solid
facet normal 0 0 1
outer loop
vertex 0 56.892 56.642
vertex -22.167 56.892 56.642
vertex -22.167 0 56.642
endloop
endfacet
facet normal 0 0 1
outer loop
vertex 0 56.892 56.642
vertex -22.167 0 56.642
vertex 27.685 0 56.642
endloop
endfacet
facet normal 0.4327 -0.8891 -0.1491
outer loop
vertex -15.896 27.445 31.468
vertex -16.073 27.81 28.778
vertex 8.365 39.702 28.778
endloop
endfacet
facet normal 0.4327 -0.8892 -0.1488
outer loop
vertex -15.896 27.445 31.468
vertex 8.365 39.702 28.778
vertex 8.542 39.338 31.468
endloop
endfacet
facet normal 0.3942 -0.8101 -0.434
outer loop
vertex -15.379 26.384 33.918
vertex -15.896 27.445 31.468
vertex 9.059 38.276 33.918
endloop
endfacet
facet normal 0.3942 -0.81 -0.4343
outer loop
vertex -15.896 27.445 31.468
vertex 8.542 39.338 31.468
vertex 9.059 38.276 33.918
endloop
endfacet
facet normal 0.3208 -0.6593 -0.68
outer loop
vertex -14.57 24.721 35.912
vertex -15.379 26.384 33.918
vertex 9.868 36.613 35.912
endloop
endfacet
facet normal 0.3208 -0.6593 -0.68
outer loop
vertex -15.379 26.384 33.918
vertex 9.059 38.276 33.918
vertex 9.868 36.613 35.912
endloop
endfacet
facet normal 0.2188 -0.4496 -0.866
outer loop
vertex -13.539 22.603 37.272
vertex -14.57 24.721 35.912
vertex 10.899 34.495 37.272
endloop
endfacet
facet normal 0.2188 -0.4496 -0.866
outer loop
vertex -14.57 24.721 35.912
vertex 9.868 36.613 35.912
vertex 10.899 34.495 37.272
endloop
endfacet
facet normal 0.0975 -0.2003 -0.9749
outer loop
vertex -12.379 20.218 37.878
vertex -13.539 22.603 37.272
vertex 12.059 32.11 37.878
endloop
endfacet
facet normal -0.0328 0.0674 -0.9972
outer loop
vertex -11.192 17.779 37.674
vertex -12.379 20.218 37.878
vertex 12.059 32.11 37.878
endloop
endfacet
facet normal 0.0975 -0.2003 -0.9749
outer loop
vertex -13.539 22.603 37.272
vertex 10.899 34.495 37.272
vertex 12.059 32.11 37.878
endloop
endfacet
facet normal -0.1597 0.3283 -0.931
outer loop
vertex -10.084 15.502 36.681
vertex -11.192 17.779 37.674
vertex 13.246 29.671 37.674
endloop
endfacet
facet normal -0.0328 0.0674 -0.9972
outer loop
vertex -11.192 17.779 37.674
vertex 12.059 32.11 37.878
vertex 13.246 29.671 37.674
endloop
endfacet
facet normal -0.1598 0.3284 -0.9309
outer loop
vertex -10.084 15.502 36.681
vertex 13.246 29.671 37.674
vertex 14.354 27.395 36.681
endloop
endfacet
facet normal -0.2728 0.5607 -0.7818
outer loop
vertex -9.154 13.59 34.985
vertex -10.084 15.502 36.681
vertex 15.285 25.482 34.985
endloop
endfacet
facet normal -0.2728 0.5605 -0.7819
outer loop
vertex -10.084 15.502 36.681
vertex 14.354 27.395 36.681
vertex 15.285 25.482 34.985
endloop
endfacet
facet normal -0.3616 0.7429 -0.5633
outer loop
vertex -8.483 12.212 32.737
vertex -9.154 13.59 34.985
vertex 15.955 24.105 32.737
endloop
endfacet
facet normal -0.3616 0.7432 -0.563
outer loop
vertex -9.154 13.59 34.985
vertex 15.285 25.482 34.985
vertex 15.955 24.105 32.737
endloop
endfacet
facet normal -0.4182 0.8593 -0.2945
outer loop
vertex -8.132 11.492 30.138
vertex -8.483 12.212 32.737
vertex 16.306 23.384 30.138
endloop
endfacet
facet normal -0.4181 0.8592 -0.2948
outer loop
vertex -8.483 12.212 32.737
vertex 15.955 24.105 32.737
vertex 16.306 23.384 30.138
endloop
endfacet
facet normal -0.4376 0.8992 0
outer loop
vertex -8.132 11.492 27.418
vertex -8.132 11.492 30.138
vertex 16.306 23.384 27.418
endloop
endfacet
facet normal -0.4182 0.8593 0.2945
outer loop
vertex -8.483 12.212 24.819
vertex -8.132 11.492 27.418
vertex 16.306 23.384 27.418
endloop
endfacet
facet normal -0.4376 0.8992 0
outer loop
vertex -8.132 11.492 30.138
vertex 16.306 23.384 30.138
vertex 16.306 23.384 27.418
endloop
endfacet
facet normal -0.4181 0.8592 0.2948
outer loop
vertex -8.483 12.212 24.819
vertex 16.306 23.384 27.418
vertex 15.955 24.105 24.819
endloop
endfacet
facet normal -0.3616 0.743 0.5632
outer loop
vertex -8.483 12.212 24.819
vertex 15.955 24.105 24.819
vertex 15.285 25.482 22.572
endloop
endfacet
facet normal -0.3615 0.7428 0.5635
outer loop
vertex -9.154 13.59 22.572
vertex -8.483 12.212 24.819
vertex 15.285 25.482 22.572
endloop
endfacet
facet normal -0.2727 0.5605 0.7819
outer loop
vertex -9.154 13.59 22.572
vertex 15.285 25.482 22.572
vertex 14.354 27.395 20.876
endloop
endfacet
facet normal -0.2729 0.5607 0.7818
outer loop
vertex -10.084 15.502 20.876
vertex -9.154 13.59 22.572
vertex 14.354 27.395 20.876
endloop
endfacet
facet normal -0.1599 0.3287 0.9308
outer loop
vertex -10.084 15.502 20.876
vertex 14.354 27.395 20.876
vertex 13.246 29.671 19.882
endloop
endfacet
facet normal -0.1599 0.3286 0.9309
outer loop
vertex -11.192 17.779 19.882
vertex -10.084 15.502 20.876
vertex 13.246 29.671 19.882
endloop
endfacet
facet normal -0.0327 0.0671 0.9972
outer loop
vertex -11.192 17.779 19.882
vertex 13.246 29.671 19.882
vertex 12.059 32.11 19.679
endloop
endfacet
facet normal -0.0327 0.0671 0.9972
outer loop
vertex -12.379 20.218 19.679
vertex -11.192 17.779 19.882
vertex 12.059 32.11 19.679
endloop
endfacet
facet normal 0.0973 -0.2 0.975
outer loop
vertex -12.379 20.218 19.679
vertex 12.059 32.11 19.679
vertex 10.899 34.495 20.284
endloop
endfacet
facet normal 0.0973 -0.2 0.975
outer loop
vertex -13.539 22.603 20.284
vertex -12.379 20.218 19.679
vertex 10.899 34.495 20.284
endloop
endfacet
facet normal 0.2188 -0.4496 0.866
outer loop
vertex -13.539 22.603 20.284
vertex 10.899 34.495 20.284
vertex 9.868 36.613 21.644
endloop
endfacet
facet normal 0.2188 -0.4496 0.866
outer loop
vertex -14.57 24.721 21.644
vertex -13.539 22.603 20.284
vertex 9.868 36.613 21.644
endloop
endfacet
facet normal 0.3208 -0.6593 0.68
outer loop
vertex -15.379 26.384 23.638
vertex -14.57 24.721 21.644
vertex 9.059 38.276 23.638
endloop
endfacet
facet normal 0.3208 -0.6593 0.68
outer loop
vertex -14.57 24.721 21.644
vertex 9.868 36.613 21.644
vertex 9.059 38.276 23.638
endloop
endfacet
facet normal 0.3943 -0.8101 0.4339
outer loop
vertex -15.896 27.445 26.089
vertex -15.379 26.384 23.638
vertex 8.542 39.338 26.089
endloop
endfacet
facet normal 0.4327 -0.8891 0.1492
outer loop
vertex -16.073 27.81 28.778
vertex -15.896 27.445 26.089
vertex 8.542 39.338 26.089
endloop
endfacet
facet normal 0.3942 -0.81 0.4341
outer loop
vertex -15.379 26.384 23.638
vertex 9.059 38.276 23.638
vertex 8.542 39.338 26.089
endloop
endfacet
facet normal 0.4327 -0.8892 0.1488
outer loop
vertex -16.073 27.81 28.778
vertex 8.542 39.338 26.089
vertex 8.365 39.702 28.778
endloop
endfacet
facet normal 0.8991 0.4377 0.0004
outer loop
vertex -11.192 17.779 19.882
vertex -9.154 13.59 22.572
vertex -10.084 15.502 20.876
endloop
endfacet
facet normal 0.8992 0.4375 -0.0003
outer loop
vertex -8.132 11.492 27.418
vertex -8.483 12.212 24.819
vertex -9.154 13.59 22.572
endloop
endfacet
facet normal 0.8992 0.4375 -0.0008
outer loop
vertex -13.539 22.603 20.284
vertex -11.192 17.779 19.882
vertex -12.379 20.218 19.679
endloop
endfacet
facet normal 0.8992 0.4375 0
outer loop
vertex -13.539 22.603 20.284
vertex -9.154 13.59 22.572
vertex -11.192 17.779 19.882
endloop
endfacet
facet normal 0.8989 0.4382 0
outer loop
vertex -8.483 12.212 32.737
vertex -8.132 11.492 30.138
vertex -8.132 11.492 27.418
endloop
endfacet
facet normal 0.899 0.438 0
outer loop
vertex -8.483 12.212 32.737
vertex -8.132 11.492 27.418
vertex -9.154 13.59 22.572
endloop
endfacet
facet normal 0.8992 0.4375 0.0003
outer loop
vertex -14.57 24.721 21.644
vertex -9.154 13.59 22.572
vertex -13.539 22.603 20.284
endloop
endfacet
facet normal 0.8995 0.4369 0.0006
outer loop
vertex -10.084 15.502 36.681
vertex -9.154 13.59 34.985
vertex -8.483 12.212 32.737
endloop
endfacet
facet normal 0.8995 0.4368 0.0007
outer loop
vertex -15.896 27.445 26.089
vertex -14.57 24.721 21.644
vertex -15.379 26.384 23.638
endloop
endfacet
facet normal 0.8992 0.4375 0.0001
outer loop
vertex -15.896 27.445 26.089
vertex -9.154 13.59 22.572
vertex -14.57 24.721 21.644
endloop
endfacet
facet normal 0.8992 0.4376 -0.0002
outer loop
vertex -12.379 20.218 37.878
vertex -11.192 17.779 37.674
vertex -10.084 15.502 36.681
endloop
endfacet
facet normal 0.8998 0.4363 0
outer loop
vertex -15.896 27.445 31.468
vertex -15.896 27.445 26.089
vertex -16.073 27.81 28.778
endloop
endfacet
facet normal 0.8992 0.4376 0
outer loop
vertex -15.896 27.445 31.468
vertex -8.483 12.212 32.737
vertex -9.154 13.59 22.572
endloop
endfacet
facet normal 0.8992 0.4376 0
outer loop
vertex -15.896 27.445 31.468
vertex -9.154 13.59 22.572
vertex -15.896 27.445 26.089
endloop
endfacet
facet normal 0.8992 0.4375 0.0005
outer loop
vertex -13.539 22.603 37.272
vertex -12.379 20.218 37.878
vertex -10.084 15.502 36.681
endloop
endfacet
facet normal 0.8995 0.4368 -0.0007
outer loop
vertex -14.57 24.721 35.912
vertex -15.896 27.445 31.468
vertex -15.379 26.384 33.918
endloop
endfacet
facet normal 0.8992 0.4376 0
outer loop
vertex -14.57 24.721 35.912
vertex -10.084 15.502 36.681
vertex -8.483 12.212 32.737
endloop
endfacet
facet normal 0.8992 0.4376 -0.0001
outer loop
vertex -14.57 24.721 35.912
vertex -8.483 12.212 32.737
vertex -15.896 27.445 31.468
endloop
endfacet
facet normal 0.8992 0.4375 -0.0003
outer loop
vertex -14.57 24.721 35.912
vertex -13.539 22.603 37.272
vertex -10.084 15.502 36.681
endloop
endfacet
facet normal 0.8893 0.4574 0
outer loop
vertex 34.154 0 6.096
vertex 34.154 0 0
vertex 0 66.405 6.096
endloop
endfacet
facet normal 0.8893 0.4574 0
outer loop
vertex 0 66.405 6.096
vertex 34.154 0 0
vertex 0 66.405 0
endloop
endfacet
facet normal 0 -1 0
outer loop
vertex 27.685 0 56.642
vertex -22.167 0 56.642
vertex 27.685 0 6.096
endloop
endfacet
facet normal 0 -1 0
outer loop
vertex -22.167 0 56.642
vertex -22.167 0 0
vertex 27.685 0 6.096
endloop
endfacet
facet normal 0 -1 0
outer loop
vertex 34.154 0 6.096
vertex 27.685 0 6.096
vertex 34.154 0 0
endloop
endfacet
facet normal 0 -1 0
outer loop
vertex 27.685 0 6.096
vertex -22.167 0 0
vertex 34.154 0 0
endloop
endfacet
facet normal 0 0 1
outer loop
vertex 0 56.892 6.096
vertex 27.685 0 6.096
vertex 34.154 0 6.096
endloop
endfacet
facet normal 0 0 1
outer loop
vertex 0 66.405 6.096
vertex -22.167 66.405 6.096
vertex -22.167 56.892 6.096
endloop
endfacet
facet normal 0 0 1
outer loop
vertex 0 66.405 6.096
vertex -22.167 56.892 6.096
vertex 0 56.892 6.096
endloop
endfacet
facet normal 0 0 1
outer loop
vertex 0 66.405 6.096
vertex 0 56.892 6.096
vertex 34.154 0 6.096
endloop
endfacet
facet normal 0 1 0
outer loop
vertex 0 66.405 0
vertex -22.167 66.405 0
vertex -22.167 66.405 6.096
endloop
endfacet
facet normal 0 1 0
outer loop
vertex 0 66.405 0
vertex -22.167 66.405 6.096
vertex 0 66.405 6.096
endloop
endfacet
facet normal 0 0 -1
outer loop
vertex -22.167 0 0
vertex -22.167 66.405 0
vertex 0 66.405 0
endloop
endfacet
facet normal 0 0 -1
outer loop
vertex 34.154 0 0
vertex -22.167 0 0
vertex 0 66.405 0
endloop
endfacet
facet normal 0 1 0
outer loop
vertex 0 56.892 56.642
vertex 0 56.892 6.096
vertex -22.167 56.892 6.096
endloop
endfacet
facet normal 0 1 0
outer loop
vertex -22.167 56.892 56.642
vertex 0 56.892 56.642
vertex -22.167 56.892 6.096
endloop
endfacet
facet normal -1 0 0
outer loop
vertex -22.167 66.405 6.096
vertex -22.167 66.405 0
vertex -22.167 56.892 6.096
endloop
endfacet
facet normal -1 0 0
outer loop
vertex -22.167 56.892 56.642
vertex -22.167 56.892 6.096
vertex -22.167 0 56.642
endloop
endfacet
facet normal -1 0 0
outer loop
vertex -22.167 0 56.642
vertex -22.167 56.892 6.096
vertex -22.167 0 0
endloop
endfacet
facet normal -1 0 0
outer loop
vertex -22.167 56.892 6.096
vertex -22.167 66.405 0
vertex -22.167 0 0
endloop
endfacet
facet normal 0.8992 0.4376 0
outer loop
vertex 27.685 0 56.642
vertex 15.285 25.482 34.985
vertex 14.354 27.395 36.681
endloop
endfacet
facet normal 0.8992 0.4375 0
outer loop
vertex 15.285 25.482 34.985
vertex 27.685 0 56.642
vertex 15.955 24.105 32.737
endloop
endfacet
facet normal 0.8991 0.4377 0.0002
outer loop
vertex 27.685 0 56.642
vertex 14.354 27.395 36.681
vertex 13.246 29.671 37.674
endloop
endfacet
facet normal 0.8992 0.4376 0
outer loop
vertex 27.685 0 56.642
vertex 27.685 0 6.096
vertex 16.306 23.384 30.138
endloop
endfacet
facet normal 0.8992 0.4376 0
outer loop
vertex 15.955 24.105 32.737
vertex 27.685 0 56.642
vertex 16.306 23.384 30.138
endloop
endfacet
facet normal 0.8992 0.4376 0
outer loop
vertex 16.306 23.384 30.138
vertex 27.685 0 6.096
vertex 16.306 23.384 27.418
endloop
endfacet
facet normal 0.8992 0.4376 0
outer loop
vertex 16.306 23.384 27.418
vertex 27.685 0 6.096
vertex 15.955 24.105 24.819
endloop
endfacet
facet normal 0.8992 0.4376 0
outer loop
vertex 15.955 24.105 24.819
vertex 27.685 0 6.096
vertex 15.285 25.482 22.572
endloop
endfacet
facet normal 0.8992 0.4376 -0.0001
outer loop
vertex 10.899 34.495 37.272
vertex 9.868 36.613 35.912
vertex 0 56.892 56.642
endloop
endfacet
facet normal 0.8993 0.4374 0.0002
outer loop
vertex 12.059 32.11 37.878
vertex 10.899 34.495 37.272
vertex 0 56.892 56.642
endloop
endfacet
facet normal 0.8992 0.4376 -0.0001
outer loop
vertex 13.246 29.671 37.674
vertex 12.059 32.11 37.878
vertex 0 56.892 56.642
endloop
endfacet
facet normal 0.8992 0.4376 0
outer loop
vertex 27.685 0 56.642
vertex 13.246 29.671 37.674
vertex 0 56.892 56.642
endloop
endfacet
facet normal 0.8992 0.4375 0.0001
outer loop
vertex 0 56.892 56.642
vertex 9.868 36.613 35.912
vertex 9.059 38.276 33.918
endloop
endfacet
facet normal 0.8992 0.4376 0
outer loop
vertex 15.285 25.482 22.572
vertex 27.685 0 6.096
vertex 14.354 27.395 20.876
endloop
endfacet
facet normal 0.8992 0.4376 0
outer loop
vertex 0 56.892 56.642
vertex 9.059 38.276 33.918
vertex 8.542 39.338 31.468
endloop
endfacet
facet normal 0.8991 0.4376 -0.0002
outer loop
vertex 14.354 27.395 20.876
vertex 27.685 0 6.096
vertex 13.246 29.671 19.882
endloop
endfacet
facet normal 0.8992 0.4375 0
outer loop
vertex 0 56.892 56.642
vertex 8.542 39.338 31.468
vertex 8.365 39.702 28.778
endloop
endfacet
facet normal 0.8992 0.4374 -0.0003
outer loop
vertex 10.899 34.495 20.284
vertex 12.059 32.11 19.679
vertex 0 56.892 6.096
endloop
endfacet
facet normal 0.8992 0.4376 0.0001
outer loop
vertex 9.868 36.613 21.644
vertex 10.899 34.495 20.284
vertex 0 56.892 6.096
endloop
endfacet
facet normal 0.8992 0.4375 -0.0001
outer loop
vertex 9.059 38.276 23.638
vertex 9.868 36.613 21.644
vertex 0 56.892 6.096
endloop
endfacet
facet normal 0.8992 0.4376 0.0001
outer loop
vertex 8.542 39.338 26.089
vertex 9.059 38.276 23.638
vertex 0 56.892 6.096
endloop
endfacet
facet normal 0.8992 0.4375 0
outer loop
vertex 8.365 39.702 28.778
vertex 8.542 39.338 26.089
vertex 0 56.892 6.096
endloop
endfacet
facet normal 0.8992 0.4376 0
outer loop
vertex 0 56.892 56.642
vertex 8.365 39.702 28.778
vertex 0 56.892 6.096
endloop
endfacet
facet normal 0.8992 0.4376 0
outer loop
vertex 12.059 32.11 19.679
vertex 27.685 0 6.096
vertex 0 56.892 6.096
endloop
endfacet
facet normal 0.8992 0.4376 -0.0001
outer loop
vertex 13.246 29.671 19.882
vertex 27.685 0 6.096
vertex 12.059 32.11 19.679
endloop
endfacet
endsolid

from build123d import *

# Parameters (mm, degrees)
F0_W     = 22.1668612212
F0_H     = 66.4054453373
F1_DEPTH = 6.096
F3_DEPTH = 50.546
F4_R     = 9.1249243662
F5_DEPTH = 27.178


with BuildPart() as f1:
    # F0 (on Top) → F1 (new body)
    with BuildSketch(Plane.XY):
        Polygon((0, 66.4054453373), (0, 0), (34.1540910304, 0), align=None)
        with Locations((-11.0834306106, 33.2027226686)):
            Rectangle(F0_W, F0_H)
    extrude(amount=F1_DEPTH)

    # F2 (on face) → F3 (join)
    with BuildSketch(Plane.XY.offset(6.096)):
        Polygon((0, 56.8917728961), (-22.1668612212, 56.8917728961), (-22.1668612212, 0), (27.6847910136, 0), align=None)
    extrude(amount=F3_DEPTH)

    # F4 (on face) → F5 (cut)
    with BuildSketch(Plane(origin=(22.3841916607, 10.892641178, 0), x_dir=(-0.4375642832, 0.8991871318, 0), z_dir=(0.8991871318, 0.4375642832, 0))):
        with Locations((22.9144543409, 28.7781264633)):
            Circle(F4_R)
    extrude(amount=-F5_DEPTH, mode=Mode.SUBTRACT)


solid = f1.part
